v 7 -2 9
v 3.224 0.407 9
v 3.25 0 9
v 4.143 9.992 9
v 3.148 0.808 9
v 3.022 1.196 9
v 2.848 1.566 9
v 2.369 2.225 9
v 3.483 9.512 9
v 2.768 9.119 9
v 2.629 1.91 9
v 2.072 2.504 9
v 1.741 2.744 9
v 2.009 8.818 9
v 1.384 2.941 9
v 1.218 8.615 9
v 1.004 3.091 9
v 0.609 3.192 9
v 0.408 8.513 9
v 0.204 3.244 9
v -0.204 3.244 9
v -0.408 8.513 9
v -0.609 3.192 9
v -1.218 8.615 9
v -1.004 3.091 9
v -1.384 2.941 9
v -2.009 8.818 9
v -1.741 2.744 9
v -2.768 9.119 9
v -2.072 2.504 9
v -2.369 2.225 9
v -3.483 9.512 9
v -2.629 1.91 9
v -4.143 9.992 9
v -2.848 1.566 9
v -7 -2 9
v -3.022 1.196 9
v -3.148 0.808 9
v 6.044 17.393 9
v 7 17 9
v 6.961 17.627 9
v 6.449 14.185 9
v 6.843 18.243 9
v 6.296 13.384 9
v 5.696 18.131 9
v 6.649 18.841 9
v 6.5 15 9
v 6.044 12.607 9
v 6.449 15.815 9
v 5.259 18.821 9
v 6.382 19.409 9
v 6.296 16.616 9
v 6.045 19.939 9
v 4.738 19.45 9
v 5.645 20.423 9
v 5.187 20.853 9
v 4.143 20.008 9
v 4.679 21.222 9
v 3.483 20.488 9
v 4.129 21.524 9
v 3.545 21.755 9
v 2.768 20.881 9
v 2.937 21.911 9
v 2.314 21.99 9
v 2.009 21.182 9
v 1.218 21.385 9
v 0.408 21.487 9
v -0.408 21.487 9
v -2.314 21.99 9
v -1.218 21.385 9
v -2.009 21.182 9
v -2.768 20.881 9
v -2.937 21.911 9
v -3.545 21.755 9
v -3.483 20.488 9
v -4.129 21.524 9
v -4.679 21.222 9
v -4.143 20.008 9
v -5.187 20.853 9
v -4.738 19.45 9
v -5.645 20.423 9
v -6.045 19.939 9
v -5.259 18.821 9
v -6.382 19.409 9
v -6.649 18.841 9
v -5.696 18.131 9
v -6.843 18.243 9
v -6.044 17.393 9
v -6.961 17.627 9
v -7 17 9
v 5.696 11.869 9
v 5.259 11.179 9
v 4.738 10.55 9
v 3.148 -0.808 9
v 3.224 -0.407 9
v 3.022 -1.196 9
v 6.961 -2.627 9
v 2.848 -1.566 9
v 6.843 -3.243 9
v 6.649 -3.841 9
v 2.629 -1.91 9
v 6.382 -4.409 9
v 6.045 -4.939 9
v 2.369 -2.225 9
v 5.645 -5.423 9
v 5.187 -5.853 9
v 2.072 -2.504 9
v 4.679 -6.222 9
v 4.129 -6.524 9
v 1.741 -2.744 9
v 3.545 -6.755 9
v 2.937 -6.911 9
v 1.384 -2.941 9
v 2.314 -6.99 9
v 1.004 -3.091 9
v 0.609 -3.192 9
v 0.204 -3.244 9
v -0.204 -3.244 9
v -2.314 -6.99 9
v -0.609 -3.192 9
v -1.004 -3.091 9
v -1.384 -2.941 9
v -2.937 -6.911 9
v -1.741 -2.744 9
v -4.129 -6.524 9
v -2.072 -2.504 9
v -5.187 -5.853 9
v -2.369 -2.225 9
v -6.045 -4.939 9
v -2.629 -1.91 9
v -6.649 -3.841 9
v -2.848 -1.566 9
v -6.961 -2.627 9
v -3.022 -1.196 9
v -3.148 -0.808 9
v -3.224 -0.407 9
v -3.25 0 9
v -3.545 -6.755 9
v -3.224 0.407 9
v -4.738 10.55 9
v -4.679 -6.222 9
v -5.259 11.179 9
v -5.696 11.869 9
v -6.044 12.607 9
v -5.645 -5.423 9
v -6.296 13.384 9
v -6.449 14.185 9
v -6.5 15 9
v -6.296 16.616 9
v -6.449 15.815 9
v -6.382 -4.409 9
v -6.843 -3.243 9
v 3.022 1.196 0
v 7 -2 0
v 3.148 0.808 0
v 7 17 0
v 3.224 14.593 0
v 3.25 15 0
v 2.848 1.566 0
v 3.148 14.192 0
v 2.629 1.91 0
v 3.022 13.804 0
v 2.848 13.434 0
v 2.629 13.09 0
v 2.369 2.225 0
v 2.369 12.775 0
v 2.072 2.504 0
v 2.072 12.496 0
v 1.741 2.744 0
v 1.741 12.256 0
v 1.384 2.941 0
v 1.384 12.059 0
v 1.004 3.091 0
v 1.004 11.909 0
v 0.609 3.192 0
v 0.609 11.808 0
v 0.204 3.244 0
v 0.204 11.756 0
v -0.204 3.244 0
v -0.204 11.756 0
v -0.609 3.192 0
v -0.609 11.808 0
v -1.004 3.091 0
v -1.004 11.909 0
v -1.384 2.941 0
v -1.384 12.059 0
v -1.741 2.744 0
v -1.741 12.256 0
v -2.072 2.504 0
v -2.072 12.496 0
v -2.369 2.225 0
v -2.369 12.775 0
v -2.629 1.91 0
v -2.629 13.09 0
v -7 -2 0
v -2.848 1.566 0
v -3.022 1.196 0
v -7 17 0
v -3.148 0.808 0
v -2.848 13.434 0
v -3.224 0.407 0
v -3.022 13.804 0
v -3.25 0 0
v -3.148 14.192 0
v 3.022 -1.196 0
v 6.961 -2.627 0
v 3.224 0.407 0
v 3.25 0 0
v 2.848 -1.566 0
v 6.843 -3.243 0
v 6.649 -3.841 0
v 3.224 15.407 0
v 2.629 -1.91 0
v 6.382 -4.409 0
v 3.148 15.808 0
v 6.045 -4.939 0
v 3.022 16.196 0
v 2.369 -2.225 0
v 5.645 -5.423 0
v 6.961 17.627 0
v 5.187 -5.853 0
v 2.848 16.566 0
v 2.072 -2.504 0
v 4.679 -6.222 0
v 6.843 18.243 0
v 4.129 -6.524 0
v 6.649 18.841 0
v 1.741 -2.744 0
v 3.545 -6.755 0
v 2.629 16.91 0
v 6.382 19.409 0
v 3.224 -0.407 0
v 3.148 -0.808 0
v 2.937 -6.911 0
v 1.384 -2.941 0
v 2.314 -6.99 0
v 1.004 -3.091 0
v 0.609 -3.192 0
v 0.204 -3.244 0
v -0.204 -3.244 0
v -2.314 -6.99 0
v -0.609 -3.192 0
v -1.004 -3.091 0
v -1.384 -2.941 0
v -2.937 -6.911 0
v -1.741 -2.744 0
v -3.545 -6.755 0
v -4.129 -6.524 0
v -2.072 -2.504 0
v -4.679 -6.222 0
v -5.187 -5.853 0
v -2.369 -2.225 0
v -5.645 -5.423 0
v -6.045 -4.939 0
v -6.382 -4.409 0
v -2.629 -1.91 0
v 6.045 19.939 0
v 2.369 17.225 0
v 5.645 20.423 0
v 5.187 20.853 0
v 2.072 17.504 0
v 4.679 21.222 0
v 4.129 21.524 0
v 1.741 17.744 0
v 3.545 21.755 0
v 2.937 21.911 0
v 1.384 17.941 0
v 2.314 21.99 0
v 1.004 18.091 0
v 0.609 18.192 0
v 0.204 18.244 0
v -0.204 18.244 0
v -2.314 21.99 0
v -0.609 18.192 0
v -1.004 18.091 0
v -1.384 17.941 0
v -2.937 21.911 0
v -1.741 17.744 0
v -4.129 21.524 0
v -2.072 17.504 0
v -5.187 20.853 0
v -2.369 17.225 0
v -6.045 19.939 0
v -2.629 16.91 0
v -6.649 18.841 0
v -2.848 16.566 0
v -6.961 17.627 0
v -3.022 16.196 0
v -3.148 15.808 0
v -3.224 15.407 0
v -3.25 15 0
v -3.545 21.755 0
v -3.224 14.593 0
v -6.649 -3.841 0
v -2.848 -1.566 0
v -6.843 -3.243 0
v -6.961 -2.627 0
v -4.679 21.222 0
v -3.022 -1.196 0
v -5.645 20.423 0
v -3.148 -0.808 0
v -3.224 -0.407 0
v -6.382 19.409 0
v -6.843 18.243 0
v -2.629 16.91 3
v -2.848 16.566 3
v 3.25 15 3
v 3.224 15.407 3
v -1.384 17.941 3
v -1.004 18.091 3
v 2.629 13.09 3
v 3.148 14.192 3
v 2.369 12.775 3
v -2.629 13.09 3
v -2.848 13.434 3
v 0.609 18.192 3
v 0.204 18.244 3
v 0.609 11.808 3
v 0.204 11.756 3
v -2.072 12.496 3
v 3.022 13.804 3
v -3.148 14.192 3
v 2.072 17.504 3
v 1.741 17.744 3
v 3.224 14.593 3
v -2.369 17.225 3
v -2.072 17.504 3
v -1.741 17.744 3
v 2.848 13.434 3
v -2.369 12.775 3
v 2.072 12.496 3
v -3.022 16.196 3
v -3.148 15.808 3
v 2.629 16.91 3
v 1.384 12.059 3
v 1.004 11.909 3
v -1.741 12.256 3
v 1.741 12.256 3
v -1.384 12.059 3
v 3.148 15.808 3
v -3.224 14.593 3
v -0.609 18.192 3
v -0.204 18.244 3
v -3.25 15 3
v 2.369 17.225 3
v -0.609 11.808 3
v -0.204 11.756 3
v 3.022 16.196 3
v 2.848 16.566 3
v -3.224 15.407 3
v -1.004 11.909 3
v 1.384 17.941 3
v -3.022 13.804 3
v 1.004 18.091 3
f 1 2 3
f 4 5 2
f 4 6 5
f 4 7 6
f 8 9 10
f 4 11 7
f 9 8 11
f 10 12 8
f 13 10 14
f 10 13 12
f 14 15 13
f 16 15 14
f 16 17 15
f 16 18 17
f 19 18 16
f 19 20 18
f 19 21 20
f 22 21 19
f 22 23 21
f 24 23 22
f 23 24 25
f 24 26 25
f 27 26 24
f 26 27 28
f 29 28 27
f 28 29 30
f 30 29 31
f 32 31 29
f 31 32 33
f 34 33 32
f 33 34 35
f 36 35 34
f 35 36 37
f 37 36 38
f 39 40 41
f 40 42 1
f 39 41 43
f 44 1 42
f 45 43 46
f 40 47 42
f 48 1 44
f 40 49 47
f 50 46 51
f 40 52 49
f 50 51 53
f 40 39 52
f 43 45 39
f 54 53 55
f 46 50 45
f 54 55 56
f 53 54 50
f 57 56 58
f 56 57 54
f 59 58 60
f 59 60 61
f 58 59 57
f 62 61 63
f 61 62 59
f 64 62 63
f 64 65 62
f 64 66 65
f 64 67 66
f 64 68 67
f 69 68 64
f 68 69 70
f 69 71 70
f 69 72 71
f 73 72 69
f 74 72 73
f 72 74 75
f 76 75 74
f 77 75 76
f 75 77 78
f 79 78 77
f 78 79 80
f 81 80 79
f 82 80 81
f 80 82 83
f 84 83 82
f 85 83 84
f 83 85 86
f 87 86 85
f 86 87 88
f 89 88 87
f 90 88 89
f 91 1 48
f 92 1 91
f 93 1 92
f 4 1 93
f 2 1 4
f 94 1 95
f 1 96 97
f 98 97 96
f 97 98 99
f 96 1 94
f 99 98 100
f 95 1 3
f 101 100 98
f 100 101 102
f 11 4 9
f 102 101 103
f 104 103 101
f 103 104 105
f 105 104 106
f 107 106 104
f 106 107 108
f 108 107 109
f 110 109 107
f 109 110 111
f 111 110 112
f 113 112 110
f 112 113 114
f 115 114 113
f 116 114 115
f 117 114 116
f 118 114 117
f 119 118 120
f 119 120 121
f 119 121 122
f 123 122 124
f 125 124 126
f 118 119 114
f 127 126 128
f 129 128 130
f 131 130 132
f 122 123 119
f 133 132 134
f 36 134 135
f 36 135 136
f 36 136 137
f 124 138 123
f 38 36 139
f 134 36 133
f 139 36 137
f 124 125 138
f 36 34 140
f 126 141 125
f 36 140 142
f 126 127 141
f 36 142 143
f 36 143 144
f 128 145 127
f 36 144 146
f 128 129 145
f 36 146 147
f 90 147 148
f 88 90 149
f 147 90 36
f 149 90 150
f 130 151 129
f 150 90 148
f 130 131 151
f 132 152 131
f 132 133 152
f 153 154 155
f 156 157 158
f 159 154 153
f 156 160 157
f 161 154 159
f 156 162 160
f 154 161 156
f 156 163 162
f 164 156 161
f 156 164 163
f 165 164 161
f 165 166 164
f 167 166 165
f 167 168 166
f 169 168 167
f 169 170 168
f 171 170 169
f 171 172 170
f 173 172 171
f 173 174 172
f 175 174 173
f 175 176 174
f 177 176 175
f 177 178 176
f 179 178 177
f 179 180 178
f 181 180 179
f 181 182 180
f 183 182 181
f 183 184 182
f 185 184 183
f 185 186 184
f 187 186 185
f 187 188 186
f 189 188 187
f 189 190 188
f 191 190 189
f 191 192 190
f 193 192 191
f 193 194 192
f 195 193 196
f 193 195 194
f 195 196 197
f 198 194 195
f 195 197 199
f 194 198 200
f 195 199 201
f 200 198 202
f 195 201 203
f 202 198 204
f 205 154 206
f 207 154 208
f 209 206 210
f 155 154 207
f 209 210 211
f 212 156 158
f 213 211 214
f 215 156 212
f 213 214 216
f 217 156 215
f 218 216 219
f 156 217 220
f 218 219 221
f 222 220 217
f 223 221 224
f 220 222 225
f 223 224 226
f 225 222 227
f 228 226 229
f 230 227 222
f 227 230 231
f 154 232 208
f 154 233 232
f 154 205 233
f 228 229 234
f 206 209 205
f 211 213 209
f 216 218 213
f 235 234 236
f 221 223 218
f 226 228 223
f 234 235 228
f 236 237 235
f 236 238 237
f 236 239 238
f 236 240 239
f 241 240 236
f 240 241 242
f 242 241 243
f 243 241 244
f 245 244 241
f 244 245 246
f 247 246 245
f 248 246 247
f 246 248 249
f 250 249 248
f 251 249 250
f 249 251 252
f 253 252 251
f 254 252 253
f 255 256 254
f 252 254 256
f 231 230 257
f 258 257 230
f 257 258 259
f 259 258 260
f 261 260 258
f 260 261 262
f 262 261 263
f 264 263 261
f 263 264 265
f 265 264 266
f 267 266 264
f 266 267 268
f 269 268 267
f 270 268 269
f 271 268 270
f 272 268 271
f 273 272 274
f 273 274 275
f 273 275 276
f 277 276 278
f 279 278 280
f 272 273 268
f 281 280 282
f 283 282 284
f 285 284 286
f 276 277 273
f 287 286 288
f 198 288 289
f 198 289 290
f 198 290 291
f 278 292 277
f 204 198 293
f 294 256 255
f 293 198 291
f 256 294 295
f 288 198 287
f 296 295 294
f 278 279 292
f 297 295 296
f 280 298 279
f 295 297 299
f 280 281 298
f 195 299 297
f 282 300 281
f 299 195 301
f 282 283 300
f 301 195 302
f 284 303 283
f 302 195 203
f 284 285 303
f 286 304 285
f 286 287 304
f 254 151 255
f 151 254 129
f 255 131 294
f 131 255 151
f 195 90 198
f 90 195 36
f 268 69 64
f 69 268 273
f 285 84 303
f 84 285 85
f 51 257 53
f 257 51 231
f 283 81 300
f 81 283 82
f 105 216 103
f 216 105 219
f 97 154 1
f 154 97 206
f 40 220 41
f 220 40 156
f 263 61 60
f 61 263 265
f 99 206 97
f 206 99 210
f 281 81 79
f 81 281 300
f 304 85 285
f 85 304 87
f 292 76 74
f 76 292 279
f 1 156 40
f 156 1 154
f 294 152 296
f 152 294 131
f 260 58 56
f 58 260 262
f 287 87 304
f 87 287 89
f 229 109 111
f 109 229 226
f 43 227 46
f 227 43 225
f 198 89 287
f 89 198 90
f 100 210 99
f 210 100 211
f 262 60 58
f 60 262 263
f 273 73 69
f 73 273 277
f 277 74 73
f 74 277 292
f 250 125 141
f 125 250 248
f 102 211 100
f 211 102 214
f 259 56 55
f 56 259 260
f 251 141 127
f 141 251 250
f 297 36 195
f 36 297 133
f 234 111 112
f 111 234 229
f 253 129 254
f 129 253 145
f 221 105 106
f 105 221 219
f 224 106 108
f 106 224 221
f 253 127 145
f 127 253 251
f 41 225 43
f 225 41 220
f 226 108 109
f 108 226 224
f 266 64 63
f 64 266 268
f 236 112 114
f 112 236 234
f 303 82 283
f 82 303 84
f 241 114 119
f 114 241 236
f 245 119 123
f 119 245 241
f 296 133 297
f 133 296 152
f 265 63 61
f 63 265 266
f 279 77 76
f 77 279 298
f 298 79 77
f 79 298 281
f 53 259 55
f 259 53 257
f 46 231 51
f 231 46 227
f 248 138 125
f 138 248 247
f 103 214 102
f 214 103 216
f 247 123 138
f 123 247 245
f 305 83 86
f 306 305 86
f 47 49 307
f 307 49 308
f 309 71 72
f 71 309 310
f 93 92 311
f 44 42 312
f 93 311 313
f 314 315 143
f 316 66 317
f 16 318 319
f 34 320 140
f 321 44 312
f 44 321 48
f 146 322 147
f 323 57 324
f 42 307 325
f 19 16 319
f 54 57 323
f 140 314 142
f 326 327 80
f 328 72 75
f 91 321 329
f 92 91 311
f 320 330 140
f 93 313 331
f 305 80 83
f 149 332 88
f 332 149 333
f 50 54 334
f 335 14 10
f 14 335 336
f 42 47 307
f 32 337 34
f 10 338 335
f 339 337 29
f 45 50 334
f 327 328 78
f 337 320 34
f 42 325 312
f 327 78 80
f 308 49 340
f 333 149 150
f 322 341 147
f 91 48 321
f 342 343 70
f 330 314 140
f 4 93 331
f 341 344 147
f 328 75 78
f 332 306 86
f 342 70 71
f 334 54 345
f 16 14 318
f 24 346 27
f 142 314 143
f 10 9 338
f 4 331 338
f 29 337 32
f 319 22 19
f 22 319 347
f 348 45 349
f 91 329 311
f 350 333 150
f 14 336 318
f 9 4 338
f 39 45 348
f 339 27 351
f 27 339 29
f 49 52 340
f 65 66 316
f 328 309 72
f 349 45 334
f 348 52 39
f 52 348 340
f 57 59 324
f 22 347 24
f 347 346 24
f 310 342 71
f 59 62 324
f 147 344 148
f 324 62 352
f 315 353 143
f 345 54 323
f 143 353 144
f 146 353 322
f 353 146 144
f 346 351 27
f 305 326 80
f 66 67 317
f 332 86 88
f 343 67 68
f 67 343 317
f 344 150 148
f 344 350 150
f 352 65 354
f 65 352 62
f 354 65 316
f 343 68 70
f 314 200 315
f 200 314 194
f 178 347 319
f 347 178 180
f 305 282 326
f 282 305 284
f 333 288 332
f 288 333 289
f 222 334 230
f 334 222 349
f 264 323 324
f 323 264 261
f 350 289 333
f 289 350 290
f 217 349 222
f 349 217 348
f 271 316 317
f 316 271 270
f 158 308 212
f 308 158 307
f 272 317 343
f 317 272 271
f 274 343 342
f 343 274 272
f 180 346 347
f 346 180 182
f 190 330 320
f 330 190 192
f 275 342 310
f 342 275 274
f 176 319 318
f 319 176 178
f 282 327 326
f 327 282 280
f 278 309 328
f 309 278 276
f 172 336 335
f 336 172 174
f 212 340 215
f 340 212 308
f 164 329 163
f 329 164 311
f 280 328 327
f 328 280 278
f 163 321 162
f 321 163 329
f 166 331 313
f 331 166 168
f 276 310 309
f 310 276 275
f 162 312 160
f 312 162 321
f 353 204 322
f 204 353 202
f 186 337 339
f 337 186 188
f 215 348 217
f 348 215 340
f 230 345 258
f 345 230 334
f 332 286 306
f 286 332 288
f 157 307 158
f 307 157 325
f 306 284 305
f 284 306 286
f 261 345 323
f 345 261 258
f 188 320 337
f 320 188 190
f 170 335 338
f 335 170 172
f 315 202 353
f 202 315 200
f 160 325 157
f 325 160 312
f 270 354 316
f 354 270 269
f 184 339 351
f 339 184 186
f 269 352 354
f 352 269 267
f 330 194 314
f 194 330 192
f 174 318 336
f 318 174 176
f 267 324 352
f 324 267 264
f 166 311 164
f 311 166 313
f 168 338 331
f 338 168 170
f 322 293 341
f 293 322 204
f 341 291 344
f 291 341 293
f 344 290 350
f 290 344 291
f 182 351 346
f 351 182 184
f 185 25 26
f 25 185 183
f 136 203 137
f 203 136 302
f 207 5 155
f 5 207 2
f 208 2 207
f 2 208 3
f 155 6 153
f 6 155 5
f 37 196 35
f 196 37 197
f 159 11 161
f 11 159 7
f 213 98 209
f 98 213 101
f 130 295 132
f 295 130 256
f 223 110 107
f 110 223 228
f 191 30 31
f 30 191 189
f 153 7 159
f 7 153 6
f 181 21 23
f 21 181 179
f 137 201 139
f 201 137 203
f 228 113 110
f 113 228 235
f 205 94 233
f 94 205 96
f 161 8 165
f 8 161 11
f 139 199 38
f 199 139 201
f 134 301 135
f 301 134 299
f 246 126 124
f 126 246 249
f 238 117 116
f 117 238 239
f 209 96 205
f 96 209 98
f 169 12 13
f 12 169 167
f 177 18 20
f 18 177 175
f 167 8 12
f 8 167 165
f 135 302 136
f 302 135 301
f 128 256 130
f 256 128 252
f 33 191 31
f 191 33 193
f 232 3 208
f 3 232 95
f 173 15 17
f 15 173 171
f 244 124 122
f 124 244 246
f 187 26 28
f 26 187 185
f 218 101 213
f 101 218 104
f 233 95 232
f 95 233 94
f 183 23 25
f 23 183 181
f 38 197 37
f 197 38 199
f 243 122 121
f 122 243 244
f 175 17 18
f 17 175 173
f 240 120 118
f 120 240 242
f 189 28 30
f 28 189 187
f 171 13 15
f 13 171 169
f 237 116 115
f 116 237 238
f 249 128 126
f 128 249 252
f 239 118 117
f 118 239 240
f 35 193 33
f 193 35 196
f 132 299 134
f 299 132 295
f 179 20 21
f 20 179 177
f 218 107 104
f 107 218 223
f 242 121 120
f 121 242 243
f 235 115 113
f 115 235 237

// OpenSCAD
$fn = 50;


difference() {
	union() {
		cylinder(h = 9, r = 7.0000000000);
		translate(v = [0.0000000000, 7.5000000000, 0]) {
			hull() {
				translate(v = [-2.0000000000, 9.5000000000, 0]) {
					cylinder(h = 9, r = 5);
				}
				translate(v = [2.0000000000, 9.5000000000, 0]) {
					cylinder(h = 9, r = 5);
				}
				translate(v = [-2.0000000000, -9.5000000000, 0]) {
					cylinder(h = 9, r = 5);
				}
				translate(v = [2.0000000000, -9.5000000000, 0]) {
					cylinder(h = 9, r = 5);
				}
			}
		}
		translate(v = [0.0000000000, 7.5000000000, 0]) {
			hull() {
				translate(v = [-2.0000000000, 9.5000000000, 0]) {
					cylinder(h = 9, r = 5);
				}
				translate(v = [2.0000000000, 9.5000000000, 0]) {
					cylinder(h = 9, r = 5);
				}
				translate(v = [-2.0000000000, -9.5000000000, 0]) {
					cylinder(h = 9, r = 5);
				}
				translate(v = [2.0000000000, -9.5000000000, 0]) {
					cylinder(h = 9, r = 5);
				}
			}
		}
	}
	union() {
		translate(v = [0.0000000000, 15.0000000000, 9]) {
			rotate(a = [0, 0, 0]) {
				difference() {
					union() {
						#translate(v = [0, 0, -9.0000000000]) {
							cylinder(h = 9, r = 2.2500000000);
						}
						#translate(v = [0, 0, -6]) {
							cylinder(h = 6, r1 = 3.2500000000, r2 = 6.5000000000);
						}
						#translate(v = [0, 0, -9.0000000000]) {
							cylinder(h = 9, r = 3.2500000000);
						}
						#translate(v = [0, 0, -9.0000000000]) {
							cylinder(h = 9, r = 2.2500000000);
						}
					}
					union();
				}
			}
		}
		translate(v = [0.0000000000, 15.0000000000, 9]) {
			rotate(a = [0, 0, 0]) {
				difference() {
					union() {
						#translate(v = [0, 0, -9.0000000000]) {
							cylinder(h = 9, r = 2.2500000000);
						}
						#translate(v = [0, 0, -6]) {
							cylinder(h = 6, r1 = 3.2500000000, r2 = 6.5000000000);
						}
						#translate(v = [0, 0, -9.0000000000]) {
							cylinder(h = 9, r = 3.2500000000);
						}
						#translate(v = [0, 0, -9.0000000000]) {
							cylinder(h = 9, r = 2.2500000000);
						}
					}
					union();
				}
			}
		}
		translate(v = [0, 0, -100]) {
			cylinder(h = 200, r = 3.2500000000);
		}
		translate(v = [0, 0, -100]) {
			cylinder(h = 200, r = 1.8000000000);
		}
	}
}
